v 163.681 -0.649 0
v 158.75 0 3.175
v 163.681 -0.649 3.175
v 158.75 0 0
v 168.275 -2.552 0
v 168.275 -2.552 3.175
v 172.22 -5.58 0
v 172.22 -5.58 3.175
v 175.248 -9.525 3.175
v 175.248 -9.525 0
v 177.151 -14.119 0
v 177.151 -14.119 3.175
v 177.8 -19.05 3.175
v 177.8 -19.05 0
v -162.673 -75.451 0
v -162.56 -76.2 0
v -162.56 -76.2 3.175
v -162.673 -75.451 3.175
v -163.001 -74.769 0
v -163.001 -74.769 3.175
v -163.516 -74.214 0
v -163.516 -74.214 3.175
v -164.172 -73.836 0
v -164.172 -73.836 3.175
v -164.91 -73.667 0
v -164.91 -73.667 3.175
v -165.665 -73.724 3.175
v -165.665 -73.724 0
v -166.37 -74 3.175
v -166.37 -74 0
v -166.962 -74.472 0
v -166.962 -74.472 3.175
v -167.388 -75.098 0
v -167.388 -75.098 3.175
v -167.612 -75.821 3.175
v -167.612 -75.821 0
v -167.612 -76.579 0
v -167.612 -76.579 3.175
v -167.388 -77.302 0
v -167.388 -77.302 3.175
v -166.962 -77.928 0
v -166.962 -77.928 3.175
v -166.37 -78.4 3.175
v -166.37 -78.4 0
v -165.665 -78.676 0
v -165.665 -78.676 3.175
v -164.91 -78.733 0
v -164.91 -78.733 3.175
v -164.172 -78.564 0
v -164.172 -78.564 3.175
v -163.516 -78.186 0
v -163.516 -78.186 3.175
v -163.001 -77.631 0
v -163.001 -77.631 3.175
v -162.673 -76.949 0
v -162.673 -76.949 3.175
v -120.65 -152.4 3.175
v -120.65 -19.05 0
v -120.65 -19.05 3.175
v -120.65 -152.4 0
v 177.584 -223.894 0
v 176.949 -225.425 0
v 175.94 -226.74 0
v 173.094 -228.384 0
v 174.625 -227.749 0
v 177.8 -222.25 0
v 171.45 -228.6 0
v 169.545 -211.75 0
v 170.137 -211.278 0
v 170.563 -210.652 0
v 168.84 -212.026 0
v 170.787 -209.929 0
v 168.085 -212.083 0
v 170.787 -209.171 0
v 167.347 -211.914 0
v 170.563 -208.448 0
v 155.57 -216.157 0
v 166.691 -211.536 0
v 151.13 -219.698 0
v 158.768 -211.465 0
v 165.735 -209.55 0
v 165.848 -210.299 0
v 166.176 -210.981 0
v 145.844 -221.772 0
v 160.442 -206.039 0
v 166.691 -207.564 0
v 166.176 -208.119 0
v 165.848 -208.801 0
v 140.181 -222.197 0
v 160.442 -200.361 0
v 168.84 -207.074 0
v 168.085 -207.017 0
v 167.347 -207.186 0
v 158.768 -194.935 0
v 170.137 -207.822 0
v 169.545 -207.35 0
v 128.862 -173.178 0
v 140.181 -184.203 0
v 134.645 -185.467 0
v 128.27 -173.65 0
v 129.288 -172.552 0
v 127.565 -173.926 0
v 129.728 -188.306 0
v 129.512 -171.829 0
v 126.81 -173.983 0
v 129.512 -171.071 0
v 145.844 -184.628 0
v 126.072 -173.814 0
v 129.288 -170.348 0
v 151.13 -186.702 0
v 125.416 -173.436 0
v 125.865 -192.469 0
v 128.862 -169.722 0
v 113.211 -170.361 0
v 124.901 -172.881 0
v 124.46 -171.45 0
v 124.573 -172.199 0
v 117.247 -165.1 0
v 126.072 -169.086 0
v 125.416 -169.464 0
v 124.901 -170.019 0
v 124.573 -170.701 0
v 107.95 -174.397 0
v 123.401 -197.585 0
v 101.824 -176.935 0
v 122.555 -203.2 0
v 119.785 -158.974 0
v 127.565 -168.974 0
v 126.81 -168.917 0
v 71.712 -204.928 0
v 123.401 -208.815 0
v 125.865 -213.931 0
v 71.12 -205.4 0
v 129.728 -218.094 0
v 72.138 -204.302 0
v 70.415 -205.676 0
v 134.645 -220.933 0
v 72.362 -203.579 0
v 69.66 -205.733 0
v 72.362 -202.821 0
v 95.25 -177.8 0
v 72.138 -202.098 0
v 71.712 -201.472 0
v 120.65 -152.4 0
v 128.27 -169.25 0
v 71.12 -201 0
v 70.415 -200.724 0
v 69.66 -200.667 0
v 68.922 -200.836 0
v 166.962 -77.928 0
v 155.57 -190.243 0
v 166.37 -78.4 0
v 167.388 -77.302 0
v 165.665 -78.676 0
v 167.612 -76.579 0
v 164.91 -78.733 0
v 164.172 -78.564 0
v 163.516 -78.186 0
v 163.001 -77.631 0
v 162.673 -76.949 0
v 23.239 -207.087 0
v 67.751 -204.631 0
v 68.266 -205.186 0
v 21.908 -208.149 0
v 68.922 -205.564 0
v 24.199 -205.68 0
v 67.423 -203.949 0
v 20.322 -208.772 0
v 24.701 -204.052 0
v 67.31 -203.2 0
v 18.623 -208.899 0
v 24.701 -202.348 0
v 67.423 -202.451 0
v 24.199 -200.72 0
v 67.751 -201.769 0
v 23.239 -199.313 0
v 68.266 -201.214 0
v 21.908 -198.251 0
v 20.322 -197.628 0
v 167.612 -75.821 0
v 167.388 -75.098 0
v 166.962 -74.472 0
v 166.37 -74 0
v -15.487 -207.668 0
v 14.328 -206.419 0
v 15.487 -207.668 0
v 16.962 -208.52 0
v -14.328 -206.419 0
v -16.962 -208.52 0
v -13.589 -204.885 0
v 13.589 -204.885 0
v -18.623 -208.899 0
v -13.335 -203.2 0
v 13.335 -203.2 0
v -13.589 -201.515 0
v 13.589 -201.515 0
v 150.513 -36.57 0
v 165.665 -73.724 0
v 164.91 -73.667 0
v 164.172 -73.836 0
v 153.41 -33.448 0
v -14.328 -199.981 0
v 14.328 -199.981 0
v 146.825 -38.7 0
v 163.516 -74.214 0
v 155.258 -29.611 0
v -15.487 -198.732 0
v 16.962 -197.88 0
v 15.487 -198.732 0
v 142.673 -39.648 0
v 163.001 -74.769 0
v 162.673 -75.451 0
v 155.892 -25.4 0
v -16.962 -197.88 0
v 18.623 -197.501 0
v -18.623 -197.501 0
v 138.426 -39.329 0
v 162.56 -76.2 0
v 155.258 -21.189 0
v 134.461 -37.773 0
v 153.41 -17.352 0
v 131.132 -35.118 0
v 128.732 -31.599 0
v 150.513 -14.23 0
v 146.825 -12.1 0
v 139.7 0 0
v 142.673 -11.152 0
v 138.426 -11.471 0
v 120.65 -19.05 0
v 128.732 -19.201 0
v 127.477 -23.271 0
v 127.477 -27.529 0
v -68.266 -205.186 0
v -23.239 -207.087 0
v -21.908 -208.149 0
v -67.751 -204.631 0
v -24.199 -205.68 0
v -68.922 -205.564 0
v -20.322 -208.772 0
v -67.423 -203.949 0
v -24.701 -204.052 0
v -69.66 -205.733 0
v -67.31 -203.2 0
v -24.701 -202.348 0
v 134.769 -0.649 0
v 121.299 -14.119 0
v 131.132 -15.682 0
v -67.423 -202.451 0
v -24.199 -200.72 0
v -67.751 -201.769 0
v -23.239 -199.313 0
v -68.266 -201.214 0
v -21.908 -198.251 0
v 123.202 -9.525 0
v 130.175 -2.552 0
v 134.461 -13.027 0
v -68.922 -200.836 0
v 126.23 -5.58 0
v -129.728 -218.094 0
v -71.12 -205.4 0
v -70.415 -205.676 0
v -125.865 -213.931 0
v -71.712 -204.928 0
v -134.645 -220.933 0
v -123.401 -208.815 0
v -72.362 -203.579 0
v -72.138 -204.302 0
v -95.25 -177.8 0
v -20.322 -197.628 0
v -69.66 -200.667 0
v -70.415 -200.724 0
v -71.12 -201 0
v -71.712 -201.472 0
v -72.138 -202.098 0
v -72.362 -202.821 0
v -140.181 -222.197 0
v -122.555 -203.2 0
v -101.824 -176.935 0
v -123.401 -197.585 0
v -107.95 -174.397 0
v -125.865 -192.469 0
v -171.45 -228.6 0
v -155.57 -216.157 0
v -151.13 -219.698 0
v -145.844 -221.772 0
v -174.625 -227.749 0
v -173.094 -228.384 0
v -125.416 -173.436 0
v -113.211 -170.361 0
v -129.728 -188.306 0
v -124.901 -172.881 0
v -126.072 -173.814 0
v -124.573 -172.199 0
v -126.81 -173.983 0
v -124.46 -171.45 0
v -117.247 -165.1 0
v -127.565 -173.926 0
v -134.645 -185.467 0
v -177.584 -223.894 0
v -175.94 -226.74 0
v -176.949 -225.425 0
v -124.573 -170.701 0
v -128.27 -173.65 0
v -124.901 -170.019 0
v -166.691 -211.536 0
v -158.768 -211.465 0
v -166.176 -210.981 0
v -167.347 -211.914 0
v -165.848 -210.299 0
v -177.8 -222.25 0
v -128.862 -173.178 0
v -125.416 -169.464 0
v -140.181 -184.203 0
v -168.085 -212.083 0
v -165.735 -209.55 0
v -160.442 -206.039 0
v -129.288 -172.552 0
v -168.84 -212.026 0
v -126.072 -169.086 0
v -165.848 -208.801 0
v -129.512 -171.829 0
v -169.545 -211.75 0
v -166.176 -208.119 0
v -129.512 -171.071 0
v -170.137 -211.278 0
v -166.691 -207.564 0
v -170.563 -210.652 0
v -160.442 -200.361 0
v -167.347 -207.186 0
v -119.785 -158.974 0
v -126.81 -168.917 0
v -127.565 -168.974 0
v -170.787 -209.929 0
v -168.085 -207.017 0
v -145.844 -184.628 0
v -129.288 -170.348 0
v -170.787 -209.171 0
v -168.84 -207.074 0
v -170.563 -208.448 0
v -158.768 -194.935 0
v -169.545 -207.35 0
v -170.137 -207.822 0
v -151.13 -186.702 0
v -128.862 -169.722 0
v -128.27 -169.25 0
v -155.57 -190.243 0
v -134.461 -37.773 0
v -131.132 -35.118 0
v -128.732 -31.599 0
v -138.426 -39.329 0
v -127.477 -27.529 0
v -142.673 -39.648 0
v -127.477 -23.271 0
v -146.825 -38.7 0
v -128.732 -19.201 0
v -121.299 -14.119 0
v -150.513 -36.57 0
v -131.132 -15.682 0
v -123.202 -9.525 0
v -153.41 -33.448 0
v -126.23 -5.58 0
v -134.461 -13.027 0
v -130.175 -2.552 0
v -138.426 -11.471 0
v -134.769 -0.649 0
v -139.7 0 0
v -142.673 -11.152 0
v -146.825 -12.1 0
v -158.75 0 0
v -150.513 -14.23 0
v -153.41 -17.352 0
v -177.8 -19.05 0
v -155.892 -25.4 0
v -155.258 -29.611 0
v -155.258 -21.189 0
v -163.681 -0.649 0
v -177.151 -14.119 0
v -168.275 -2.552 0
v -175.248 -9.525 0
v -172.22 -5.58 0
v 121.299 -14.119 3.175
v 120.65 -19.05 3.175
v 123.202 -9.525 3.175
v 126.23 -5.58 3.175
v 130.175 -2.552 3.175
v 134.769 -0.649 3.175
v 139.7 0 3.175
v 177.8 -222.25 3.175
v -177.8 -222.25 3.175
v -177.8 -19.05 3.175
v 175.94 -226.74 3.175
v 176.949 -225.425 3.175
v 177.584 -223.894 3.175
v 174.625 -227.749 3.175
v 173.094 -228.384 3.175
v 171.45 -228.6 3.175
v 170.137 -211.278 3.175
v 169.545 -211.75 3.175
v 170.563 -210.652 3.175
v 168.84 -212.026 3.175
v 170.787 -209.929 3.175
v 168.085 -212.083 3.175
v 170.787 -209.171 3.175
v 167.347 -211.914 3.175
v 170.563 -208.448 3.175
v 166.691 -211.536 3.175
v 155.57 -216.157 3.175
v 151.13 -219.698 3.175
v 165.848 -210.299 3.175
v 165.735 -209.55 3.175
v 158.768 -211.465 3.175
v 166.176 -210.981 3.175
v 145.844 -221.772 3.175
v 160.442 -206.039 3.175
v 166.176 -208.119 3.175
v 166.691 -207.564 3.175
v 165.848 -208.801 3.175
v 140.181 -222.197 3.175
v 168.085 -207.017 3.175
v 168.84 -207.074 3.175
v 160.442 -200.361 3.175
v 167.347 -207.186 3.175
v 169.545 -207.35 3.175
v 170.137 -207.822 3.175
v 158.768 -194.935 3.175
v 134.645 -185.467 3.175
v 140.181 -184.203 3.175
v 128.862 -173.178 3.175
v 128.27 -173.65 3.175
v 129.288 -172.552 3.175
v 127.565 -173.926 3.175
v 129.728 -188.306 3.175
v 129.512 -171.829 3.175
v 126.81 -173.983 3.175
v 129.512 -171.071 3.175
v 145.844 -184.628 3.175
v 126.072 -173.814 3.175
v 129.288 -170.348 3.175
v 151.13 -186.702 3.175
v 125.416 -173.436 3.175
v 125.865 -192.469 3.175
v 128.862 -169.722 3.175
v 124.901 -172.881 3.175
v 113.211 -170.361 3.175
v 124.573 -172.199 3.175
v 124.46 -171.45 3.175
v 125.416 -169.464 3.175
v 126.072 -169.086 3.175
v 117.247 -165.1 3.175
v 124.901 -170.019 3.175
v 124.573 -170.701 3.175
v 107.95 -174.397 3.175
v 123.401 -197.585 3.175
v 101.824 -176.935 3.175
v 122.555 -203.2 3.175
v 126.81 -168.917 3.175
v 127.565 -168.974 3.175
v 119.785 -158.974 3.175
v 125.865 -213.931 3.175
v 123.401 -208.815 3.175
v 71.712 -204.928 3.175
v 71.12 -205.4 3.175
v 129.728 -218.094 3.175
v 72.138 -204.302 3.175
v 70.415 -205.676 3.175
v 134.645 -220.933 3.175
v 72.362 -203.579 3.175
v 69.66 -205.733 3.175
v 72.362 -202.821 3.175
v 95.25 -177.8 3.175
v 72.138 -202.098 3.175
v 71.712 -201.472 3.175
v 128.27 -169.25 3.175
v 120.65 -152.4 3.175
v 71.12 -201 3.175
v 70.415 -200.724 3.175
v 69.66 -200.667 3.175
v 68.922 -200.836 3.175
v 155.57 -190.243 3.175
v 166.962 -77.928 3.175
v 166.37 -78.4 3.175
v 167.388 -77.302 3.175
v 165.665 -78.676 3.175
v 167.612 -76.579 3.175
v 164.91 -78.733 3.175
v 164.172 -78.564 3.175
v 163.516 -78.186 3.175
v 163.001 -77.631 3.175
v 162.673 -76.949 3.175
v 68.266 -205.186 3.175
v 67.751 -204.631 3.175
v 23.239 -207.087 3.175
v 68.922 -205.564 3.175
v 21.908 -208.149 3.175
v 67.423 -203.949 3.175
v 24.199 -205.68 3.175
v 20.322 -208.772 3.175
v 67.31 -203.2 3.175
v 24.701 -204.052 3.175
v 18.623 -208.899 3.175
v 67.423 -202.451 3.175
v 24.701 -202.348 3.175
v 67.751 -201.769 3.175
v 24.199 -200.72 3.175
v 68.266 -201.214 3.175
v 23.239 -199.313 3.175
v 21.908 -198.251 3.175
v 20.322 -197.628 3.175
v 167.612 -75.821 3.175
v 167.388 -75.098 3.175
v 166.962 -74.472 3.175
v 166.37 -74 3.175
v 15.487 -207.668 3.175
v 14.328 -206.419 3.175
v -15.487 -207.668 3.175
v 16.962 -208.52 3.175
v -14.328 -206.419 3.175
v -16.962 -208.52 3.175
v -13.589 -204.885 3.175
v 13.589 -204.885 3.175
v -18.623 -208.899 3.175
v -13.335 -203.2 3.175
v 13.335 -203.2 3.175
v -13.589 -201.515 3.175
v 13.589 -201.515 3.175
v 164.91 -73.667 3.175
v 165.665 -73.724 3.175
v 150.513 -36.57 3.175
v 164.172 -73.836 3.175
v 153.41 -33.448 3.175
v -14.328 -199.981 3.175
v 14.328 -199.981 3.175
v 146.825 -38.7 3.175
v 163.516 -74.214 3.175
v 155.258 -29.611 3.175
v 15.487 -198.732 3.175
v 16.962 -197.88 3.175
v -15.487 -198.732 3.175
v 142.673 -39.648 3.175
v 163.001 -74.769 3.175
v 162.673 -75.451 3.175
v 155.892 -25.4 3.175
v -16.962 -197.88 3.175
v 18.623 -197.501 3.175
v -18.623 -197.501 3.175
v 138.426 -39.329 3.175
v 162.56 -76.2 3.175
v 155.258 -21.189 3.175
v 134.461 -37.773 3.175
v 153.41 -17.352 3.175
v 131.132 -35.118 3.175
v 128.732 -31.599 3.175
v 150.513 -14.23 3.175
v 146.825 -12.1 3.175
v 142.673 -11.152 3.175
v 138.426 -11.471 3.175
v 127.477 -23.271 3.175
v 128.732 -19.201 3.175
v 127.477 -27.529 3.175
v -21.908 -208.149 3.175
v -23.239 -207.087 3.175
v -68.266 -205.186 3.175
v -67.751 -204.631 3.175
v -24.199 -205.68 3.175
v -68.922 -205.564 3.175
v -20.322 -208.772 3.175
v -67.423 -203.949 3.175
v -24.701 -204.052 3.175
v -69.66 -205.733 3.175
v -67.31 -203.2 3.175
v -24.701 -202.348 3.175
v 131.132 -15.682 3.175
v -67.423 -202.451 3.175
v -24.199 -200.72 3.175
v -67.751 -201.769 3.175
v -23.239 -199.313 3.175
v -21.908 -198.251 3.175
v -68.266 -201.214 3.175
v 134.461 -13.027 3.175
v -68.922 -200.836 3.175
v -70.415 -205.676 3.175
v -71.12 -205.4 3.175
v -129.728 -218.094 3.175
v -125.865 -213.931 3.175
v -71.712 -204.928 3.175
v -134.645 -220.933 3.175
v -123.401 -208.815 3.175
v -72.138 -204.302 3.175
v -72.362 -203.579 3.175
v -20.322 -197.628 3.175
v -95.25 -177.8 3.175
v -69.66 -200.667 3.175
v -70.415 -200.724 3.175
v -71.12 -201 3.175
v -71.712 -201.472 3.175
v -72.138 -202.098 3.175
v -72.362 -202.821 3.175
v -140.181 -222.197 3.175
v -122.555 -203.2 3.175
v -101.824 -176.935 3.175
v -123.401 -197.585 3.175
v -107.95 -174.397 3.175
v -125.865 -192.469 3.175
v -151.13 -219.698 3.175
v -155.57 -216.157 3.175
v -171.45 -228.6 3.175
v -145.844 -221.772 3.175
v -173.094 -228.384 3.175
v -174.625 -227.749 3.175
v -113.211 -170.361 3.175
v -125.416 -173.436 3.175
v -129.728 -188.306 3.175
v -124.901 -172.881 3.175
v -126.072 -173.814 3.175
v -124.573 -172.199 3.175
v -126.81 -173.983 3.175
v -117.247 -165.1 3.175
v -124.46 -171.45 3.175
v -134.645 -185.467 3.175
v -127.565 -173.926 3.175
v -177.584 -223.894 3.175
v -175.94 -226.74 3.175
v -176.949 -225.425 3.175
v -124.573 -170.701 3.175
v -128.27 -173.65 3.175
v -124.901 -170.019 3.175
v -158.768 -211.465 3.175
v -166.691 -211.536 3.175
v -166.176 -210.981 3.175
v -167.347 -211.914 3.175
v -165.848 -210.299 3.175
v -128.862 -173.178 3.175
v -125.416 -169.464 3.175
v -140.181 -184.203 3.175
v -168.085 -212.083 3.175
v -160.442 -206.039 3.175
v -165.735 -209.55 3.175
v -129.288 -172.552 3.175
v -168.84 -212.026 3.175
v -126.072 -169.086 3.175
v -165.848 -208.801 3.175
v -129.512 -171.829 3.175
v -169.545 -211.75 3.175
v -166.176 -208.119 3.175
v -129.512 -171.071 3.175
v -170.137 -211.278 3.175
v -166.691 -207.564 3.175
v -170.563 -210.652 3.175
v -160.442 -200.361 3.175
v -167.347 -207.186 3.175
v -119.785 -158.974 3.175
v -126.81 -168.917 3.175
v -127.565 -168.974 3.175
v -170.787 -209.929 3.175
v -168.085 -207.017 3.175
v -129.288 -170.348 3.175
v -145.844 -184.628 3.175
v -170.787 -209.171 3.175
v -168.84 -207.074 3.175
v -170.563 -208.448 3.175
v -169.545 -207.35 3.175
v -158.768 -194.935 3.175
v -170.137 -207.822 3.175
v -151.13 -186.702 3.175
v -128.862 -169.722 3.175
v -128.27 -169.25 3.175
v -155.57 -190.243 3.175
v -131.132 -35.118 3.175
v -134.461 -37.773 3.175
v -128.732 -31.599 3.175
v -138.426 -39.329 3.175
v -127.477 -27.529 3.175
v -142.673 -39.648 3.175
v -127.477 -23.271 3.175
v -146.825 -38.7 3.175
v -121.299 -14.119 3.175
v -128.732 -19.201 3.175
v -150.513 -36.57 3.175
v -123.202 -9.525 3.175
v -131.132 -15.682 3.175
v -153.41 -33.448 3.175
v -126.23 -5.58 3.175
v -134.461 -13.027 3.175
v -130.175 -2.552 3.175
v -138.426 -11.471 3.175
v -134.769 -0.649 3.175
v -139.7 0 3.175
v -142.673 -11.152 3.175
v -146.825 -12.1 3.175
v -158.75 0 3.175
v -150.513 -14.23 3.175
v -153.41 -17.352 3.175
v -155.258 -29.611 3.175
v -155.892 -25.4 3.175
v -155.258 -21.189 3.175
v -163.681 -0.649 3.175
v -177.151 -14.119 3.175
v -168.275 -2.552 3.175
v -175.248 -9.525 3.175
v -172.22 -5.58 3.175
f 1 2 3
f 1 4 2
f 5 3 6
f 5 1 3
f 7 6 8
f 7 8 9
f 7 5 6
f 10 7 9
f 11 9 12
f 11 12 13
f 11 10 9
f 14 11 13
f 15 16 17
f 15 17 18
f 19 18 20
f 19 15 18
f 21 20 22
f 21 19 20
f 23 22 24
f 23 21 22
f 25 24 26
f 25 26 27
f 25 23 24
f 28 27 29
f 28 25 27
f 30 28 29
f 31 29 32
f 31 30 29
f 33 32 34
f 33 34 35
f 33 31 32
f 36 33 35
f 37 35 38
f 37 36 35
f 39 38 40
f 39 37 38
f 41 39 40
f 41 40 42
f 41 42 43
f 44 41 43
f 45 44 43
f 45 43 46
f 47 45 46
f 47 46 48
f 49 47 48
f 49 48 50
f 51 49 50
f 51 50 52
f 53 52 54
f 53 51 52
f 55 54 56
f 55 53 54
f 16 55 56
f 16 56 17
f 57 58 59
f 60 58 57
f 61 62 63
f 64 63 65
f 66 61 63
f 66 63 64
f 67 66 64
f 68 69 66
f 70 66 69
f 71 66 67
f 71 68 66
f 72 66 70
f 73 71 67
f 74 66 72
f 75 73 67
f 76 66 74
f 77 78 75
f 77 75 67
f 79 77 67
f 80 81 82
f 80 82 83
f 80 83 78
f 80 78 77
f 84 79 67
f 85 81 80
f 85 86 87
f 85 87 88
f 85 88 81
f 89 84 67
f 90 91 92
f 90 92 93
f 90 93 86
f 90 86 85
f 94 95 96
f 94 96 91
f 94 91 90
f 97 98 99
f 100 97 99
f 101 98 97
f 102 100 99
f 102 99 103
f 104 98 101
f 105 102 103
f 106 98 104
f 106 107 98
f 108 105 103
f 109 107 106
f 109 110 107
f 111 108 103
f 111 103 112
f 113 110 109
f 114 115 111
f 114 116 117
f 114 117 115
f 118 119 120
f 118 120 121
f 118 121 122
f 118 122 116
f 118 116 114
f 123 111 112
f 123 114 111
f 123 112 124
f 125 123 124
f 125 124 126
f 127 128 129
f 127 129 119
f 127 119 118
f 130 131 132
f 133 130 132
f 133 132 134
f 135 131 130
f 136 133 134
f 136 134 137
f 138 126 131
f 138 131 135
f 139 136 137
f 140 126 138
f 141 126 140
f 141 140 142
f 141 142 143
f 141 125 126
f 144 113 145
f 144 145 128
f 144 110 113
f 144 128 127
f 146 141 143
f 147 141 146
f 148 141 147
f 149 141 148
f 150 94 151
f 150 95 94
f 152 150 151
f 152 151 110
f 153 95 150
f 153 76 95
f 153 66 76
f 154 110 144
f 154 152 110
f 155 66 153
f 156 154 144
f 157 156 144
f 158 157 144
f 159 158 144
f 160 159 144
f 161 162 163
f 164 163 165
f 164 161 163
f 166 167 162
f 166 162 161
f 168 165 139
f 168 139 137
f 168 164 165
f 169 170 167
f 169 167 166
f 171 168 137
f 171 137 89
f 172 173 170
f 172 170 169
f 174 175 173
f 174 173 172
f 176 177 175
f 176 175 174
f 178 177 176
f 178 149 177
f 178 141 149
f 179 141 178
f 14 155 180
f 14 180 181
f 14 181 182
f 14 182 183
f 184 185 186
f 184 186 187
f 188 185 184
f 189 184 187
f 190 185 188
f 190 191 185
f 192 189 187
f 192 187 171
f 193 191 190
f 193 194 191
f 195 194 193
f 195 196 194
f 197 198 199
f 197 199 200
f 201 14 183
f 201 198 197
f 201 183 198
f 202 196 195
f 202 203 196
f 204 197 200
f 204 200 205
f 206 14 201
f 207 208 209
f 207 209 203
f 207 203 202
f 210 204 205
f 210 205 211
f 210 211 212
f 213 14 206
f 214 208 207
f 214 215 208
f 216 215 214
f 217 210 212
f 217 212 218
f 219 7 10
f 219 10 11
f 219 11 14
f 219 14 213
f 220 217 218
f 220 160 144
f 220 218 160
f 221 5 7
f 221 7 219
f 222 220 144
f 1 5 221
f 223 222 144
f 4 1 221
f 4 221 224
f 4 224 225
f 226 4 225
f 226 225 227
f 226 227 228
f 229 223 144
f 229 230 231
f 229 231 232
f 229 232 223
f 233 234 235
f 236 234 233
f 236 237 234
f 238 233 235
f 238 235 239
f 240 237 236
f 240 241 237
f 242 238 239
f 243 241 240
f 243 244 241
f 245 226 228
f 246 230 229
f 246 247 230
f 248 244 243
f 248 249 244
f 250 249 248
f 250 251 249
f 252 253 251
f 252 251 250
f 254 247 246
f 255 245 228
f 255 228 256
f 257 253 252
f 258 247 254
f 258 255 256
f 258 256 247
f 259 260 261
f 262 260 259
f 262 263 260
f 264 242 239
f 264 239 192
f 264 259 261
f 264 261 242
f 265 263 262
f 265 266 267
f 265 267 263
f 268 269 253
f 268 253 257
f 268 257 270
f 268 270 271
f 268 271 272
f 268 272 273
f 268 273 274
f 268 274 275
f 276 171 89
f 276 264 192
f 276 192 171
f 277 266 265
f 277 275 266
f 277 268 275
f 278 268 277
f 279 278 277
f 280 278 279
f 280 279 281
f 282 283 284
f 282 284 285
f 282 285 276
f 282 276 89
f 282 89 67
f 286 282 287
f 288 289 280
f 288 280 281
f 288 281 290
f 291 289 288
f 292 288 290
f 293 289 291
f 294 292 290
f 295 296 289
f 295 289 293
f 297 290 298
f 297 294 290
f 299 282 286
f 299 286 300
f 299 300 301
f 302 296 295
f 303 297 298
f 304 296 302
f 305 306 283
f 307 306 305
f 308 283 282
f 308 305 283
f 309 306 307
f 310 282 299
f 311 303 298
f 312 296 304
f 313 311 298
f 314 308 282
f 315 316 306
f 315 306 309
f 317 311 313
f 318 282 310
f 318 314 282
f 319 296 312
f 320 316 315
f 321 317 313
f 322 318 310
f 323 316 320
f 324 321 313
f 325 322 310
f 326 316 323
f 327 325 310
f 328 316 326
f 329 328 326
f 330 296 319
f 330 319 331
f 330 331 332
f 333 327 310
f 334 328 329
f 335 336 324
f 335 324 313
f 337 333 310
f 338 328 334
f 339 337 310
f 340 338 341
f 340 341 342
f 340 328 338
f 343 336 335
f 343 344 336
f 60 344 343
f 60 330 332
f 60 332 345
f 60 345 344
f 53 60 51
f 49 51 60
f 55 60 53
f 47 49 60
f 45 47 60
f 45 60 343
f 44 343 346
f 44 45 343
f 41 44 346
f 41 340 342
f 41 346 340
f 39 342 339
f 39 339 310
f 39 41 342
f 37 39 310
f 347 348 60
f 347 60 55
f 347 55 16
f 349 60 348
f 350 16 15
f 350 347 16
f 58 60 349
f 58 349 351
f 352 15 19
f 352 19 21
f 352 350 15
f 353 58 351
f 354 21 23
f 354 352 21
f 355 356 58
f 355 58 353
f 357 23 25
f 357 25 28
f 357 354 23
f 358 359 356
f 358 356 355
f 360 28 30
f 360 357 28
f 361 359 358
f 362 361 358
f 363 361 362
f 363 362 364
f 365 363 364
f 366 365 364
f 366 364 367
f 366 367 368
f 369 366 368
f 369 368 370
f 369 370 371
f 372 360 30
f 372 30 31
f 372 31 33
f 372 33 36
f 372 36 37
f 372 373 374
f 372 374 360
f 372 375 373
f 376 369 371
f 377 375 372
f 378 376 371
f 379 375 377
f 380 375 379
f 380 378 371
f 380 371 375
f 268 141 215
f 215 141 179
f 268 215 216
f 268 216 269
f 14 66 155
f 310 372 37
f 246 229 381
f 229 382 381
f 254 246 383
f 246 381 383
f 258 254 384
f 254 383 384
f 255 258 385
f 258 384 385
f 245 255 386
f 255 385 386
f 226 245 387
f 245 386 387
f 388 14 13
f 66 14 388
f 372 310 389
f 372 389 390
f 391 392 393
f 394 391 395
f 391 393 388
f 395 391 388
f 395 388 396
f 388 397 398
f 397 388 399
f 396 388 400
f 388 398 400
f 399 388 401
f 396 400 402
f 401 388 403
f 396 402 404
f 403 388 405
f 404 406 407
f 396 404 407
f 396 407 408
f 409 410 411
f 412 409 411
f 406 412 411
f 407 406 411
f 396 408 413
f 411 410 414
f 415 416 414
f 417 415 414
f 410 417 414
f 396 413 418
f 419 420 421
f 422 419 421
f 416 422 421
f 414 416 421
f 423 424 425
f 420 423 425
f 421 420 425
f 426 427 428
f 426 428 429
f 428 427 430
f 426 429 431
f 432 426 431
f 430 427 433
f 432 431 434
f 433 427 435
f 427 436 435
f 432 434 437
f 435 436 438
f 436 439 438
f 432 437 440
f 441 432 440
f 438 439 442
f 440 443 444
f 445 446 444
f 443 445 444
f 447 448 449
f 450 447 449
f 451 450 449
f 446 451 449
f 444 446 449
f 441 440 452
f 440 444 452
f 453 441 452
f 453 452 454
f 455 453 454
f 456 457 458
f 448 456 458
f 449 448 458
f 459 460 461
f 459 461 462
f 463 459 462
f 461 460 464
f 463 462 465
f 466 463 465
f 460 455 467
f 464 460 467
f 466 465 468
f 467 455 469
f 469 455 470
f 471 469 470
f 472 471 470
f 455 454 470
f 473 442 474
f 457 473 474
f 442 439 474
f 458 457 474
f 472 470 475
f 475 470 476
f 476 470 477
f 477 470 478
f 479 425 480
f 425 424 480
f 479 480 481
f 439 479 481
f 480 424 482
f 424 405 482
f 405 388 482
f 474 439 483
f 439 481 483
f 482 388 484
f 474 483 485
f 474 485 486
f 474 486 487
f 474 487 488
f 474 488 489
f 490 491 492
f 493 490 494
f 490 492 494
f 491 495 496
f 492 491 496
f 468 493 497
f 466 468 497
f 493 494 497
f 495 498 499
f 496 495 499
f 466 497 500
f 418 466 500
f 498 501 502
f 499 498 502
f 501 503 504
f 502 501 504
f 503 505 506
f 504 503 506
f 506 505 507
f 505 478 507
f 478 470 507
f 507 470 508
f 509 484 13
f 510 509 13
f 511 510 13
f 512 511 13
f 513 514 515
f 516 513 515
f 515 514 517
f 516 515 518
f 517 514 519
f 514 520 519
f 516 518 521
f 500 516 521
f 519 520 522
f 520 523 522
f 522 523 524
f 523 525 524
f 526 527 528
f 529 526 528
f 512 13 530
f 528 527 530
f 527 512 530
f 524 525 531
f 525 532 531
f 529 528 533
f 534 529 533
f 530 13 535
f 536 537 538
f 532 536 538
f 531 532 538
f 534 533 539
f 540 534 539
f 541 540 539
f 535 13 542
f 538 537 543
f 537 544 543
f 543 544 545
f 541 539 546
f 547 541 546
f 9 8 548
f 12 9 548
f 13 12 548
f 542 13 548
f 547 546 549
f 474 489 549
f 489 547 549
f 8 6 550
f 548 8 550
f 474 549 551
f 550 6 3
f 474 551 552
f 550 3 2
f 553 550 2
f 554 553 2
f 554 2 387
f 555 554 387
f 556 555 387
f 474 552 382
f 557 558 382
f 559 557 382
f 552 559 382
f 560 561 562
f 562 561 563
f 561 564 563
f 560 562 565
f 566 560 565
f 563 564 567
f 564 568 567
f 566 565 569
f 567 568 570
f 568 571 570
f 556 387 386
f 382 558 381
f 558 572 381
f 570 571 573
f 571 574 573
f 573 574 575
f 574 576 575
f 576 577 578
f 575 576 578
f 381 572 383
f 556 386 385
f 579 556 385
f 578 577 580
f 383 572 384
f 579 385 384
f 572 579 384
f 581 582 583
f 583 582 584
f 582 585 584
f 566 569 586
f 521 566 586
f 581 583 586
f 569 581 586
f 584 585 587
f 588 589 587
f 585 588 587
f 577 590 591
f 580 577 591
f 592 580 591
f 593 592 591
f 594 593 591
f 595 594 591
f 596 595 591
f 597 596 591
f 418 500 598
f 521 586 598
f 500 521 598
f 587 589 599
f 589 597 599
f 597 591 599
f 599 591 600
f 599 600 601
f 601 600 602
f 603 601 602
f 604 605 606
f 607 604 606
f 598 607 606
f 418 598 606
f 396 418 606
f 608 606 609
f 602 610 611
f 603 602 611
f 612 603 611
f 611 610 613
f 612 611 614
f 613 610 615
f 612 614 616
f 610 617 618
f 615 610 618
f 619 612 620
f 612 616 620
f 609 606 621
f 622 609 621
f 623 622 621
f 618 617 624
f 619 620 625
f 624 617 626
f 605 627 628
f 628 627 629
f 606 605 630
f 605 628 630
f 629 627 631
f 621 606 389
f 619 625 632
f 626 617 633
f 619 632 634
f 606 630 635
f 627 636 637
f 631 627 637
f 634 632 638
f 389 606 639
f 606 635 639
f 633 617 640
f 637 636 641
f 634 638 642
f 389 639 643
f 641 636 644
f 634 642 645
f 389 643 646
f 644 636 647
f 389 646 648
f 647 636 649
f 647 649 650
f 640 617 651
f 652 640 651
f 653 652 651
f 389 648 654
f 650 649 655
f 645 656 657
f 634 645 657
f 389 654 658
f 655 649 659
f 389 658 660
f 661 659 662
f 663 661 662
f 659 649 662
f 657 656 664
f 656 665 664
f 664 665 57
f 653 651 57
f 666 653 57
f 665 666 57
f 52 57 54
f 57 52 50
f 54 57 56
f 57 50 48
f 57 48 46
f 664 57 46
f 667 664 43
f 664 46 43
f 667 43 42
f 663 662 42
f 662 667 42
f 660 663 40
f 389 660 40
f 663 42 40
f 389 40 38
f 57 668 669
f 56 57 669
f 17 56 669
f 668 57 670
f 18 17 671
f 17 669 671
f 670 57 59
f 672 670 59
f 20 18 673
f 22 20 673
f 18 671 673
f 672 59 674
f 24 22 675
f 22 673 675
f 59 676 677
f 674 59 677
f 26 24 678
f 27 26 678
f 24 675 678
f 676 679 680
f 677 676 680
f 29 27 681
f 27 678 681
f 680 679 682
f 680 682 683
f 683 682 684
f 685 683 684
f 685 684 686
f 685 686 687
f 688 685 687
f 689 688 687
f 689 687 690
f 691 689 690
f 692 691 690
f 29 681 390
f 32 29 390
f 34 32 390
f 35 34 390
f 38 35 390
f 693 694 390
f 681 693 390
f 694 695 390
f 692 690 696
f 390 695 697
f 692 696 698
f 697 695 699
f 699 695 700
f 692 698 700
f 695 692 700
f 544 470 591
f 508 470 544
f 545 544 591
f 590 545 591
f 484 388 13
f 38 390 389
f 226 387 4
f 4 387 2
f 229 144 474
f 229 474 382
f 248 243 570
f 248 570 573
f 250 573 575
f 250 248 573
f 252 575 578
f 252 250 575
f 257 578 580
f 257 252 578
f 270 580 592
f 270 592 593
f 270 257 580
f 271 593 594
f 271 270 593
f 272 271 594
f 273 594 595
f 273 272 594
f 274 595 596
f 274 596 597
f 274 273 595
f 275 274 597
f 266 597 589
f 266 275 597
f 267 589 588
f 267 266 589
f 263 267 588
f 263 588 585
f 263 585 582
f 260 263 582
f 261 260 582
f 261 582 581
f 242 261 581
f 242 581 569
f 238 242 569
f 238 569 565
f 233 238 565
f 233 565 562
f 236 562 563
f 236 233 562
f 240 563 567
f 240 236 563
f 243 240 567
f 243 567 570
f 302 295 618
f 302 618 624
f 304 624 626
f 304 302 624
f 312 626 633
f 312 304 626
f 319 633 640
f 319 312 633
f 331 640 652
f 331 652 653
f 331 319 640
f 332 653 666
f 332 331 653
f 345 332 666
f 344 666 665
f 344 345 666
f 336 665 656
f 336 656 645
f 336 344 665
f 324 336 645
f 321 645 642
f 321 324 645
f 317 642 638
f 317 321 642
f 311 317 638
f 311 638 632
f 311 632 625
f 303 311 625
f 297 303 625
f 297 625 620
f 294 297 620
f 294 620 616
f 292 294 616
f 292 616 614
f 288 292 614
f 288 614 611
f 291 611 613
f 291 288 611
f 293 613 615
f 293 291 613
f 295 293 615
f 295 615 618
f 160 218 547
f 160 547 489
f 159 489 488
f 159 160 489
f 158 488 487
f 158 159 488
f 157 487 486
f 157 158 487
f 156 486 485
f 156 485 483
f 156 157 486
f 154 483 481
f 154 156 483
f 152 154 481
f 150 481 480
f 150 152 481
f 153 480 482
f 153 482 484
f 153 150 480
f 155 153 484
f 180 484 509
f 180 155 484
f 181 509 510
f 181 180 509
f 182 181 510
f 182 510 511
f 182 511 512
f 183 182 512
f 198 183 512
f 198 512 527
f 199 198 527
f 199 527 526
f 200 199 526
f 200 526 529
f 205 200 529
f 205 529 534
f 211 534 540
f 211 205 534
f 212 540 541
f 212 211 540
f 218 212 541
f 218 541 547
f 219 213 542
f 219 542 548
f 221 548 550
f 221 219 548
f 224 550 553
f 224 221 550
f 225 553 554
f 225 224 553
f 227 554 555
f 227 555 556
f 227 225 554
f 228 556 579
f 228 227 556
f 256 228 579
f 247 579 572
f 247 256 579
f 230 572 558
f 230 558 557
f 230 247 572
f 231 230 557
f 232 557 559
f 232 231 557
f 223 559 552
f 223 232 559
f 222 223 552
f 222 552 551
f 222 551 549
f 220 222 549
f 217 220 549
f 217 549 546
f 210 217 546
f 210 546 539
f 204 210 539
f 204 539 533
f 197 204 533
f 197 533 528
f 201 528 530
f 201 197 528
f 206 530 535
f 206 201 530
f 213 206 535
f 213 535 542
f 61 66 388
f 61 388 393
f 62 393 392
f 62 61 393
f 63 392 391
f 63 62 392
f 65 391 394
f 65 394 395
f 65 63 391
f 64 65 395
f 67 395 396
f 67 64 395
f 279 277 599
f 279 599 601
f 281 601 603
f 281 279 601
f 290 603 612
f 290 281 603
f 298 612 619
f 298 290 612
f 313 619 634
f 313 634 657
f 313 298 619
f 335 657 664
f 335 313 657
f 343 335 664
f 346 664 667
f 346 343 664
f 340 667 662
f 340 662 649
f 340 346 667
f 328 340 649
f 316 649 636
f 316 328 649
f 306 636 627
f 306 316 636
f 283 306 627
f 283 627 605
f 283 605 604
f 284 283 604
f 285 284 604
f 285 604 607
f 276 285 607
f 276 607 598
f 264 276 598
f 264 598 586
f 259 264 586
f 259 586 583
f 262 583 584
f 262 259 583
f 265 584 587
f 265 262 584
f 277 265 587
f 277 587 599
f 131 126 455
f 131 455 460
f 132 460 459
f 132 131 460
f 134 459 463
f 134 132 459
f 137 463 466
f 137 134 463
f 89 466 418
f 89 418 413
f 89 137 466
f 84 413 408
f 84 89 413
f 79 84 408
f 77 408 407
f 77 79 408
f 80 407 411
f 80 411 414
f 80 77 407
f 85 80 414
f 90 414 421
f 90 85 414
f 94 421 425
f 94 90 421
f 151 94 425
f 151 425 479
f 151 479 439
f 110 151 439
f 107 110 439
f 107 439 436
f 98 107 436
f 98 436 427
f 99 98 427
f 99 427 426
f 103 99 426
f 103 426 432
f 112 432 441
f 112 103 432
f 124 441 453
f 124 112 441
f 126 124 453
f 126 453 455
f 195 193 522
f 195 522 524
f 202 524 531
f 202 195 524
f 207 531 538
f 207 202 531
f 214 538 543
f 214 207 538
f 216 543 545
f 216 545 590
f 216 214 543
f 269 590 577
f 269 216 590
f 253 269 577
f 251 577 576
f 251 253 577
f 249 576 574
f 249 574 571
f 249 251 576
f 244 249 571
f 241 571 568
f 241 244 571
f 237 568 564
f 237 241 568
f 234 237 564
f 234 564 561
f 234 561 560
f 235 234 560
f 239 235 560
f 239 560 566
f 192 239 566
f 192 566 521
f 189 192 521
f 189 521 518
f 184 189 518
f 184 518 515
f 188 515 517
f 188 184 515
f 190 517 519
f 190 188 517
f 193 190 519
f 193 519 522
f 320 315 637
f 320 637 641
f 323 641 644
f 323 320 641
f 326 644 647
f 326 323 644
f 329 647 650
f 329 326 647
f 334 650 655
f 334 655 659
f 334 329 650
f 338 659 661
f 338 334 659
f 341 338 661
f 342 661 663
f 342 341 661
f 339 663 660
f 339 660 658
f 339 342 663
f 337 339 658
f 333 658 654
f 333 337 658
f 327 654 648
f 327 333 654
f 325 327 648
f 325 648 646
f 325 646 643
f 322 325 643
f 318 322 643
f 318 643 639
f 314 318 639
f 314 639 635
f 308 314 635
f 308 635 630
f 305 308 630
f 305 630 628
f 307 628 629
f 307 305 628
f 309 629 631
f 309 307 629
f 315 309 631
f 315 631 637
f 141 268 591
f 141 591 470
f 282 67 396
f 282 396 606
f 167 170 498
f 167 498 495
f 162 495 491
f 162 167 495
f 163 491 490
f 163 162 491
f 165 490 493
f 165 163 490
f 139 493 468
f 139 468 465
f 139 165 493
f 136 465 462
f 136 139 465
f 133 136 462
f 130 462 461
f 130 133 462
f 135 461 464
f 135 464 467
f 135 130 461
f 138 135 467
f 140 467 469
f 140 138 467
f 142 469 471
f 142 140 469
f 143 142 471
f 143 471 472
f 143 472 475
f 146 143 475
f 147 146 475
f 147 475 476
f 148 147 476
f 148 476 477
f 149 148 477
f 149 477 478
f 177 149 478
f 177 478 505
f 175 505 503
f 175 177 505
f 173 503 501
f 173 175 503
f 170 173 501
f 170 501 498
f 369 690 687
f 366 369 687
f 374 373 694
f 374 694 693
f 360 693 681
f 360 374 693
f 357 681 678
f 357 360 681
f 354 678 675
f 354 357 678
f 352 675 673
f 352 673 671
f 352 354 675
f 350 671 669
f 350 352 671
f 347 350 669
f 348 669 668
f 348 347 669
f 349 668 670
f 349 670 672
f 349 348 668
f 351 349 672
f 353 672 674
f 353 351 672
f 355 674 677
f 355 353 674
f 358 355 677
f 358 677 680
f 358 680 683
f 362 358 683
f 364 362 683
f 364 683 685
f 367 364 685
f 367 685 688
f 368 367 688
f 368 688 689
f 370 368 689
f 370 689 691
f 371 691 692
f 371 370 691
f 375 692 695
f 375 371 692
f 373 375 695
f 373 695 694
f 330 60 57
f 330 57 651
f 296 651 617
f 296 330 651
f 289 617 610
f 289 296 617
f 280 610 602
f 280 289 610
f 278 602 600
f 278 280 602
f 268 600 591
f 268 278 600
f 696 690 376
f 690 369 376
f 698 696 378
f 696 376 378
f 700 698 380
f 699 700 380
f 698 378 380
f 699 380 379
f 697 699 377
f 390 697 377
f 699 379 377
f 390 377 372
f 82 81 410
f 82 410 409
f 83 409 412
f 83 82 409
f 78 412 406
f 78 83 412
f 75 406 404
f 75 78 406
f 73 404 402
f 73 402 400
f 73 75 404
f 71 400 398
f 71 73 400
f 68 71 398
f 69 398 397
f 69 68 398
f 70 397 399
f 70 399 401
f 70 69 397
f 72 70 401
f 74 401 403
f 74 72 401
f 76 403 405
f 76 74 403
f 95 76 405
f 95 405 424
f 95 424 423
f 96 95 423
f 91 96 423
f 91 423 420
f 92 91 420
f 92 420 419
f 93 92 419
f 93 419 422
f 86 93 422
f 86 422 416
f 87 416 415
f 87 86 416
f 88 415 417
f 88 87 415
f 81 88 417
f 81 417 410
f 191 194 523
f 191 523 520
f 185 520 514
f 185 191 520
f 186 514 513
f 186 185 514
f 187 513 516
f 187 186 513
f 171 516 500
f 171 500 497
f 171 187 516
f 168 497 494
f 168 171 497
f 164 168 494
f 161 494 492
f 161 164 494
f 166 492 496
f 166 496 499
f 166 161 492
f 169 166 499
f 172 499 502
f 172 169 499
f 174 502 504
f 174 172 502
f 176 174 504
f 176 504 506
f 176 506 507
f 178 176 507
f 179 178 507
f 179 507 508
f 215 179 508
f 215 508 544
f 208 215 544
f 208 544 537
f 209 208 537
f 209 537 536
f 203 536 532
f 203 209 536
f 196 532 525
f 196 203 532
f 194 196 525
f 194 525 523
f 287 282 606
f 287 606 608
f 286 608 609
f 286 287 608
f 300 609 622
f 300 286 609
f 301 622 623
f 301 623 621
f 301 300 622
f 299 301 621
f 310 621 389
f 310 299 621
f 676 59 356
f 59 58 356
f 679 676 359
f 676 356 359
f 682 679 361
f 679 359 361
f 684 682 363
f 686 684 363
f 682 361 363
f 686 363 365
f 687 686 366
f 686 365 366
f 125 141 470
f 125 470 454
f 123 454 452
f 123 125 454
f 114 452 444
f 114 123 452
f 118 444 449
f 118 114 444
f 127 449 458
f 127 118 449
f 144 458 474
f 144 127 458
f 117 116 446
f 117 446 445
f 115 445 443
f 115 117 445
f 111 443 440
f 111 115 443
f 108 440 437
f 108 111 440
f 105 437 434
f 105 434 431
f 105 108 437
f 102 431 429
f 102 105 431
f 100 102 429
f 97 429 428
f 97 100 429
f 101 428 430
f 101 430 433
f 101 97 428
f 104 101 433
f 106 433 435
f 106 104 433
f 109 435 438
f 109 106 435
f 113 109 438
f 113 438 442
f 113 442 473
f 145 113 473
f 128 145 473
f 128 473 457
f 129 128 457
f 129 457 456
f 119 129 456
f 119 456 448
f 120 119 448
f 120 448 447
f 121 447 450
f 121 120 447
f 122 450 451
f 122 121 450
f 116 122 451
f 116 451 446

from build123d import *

# Parameters (mm, degrees)
SKETCH1_R           = 14.2875
SKETCH1_R_2         = 19.05
SKETCH1_R_3         = 2.54
SKETCH1_R_4         = 5.715
BOSS_EXTRUDE3_DEPTH = 3.175
SKETCH2_W           = 355.6
SKETCH2_H           = 19.05
CUT_EXTRUDE1_DEPTH  = 290.621961572
FILLET1_R           = 19.05


with BuildPart() as part:
    # Sketch1 → Boss-Extrude3 (new body)
    with BuildSketch(Plane.XY):
        with BuildLine():
            Line((120.65, -152.4), (120.65, -6.35))
            Line((120.65, -6.35), (120.65, 6.35))
            ThreePointArc((120.65, 6.35), (124.369743879, 15.330256121), (133.35, 19.05))
            Line((133.35, 19.05), (165.1, 19.05))
            ThreePointArc((165.1, 19.05), (174.080256121, 15.330256121), (177.8, 6.35))
            Line((177.8, 6.35), (177.8, -6.35))
            Line((177.8, -6.35), (177.8, -222.25))
            ThreePointArc((177.8, -222.25), (175.940128061, -226.740128061), (171.45, -228.6))
            Line((171.45, -228.6), (12.7, -228.6))
            Line((12.7, -228.6), (-12.7, -228.6))
            Line((-12.7, -228.6), (-171.45, -228.6))
            ThreePointArc((-171.45, -228.6), (-175.940128061, -226.740128061), (-177.8, -222.25))
            Line((-177.8, -222.25), (-177.8, -6.35))
            Line((-177.8, -6.35), (-177.8, 6.35))
            ThreePointArc((-177.8, 6.35), (-174.080256121, 15.330256121), (-165.1, 19.05))
            Line((-165.1, 19.05), (-133.35, 19.05))
            ThreePointArc((-133.35, 19.05), (-124.369743879, 15.330256121), (-120.65, 6.35))
            Line((-120.65, 6.35), (-120.65, -6.35))
            Line((-120.65, -6.35), (-120.65, -152.4))
            ThreePointArc((-120.65, -152.4), (-113.210512242, -170.360512242), (-95.25, -177.8))
            Line((-95.25, -177.8), (-12.7, -177.8))
            Line((-12.7, -177.8), (12.7, -177.8))
            Line((12.7, -177.8), (95.25, -177.8))
            ThreePointArc((95.25, -177.8), (113.210512242, -170.360512242), (120.65, -152.4))
        make_face()
        with Locations((141.605, -25.4)):
            Circle(SKETCH1_R, mode=Mode.SUBTRACT)
        with Locations(Location((-141.605, -25.4, 0), (0, 0, 180))):
            Circle(SKETCH1_R, mode=Mode.SUBTRACT)
        with Locations((-141.605, -203.2)):
            Circle(SKETCH1_R_2, mode=Mode.SUBTRACT)
        with Locations(Location((141.605, -203.2, 0), (0, 0, 180))):
            Circle(SKETCH1_R_2, mode=Mode.SUBTRACT)
        with Locations((-69.85, -203.2)):
            Circle(SKETCH1_R_3, mode=Mode.SUBTRACT)
        with Locations(Location((69.85, -203.2, 0), (0, 0, 180))):
            Circle(SKETCH1_R_3, mode=Mode.SUBTRACT)
        with Locations((-19.05, -203.2)):
            Circle(SKETCH1_R_4, mode=Mode.SUBTRACT)
        with Locations((-149.225, 6.35)):
            Circle(SKETCH1_R_3, mode=Mode.SUBTRACT)
        with Locations(Location((149.225, 6.35, 0), (0, 0, 180))):
            Circle(SKETCH1_R_3, mode=Mode.SUBTRACT)
        with Locations((-168.275, -209.55)):
            Circle(SKETCH1_R_3, mode=Mode.SUBTRACT)
        with Locations(Location((168.275, -209.55, 0), (0, 0, 180))):
            Circle(SKETCH1_R_3, mode=Mode.SUBTRACT)
        with Locations((-165.1, -76.2)):
            Circle(SKETCH1_R_3, mode=Mode.SUBTRACT)
        with Locations(Location((165.1, -76.2, 0), (0, 0, 180))):
            Circle(SKETCH1_R_3, mode=Mode.SUBTRACT)
        with Locations((-127, -171.45)):
            Circle(SKETCH1_R_3, mode=Mode.SUBTRACT)
        with Locations(Location((127, -171.45, 0), (0, 0, 180))):
            Circle(SKETCH1_R_3, mode=Mode.SUBTRACT)
        with Locations(Location((19.05, -203.2, 0), (0, 0, 180))):
            Circle(SKETCH1_R_4, mode=Mode.SUBTRACT)
    extrude(amount=BOSS_EXTRUDE3_DEPTH)

    # Sketch2 → Cut-Extrude1 (cut, through all)
    with BuildSketch(Plane.XY.offset(3.175)):
        with Locations((0, 9.525)):
            Rectangle(SKETCH2_W, SKETCH2_H)
    extrude(amount=-CUT_EXTRUDE1_DEPTH, mode=Mode.SUBTRACT)

    # Fillet1
    fillet1_edges = [part.edges().sort_by_distance(p)[0] for p in [
        (-177.8, 0, 1.5875),
        (120.65, 0, 1.5875),
        (177.8, 0, 1.5875),
        (-120.65, 0, 1.5875),
    ]]
    fillet(fillet1_edges, radius=FILLET1_R)


solid = part.part
